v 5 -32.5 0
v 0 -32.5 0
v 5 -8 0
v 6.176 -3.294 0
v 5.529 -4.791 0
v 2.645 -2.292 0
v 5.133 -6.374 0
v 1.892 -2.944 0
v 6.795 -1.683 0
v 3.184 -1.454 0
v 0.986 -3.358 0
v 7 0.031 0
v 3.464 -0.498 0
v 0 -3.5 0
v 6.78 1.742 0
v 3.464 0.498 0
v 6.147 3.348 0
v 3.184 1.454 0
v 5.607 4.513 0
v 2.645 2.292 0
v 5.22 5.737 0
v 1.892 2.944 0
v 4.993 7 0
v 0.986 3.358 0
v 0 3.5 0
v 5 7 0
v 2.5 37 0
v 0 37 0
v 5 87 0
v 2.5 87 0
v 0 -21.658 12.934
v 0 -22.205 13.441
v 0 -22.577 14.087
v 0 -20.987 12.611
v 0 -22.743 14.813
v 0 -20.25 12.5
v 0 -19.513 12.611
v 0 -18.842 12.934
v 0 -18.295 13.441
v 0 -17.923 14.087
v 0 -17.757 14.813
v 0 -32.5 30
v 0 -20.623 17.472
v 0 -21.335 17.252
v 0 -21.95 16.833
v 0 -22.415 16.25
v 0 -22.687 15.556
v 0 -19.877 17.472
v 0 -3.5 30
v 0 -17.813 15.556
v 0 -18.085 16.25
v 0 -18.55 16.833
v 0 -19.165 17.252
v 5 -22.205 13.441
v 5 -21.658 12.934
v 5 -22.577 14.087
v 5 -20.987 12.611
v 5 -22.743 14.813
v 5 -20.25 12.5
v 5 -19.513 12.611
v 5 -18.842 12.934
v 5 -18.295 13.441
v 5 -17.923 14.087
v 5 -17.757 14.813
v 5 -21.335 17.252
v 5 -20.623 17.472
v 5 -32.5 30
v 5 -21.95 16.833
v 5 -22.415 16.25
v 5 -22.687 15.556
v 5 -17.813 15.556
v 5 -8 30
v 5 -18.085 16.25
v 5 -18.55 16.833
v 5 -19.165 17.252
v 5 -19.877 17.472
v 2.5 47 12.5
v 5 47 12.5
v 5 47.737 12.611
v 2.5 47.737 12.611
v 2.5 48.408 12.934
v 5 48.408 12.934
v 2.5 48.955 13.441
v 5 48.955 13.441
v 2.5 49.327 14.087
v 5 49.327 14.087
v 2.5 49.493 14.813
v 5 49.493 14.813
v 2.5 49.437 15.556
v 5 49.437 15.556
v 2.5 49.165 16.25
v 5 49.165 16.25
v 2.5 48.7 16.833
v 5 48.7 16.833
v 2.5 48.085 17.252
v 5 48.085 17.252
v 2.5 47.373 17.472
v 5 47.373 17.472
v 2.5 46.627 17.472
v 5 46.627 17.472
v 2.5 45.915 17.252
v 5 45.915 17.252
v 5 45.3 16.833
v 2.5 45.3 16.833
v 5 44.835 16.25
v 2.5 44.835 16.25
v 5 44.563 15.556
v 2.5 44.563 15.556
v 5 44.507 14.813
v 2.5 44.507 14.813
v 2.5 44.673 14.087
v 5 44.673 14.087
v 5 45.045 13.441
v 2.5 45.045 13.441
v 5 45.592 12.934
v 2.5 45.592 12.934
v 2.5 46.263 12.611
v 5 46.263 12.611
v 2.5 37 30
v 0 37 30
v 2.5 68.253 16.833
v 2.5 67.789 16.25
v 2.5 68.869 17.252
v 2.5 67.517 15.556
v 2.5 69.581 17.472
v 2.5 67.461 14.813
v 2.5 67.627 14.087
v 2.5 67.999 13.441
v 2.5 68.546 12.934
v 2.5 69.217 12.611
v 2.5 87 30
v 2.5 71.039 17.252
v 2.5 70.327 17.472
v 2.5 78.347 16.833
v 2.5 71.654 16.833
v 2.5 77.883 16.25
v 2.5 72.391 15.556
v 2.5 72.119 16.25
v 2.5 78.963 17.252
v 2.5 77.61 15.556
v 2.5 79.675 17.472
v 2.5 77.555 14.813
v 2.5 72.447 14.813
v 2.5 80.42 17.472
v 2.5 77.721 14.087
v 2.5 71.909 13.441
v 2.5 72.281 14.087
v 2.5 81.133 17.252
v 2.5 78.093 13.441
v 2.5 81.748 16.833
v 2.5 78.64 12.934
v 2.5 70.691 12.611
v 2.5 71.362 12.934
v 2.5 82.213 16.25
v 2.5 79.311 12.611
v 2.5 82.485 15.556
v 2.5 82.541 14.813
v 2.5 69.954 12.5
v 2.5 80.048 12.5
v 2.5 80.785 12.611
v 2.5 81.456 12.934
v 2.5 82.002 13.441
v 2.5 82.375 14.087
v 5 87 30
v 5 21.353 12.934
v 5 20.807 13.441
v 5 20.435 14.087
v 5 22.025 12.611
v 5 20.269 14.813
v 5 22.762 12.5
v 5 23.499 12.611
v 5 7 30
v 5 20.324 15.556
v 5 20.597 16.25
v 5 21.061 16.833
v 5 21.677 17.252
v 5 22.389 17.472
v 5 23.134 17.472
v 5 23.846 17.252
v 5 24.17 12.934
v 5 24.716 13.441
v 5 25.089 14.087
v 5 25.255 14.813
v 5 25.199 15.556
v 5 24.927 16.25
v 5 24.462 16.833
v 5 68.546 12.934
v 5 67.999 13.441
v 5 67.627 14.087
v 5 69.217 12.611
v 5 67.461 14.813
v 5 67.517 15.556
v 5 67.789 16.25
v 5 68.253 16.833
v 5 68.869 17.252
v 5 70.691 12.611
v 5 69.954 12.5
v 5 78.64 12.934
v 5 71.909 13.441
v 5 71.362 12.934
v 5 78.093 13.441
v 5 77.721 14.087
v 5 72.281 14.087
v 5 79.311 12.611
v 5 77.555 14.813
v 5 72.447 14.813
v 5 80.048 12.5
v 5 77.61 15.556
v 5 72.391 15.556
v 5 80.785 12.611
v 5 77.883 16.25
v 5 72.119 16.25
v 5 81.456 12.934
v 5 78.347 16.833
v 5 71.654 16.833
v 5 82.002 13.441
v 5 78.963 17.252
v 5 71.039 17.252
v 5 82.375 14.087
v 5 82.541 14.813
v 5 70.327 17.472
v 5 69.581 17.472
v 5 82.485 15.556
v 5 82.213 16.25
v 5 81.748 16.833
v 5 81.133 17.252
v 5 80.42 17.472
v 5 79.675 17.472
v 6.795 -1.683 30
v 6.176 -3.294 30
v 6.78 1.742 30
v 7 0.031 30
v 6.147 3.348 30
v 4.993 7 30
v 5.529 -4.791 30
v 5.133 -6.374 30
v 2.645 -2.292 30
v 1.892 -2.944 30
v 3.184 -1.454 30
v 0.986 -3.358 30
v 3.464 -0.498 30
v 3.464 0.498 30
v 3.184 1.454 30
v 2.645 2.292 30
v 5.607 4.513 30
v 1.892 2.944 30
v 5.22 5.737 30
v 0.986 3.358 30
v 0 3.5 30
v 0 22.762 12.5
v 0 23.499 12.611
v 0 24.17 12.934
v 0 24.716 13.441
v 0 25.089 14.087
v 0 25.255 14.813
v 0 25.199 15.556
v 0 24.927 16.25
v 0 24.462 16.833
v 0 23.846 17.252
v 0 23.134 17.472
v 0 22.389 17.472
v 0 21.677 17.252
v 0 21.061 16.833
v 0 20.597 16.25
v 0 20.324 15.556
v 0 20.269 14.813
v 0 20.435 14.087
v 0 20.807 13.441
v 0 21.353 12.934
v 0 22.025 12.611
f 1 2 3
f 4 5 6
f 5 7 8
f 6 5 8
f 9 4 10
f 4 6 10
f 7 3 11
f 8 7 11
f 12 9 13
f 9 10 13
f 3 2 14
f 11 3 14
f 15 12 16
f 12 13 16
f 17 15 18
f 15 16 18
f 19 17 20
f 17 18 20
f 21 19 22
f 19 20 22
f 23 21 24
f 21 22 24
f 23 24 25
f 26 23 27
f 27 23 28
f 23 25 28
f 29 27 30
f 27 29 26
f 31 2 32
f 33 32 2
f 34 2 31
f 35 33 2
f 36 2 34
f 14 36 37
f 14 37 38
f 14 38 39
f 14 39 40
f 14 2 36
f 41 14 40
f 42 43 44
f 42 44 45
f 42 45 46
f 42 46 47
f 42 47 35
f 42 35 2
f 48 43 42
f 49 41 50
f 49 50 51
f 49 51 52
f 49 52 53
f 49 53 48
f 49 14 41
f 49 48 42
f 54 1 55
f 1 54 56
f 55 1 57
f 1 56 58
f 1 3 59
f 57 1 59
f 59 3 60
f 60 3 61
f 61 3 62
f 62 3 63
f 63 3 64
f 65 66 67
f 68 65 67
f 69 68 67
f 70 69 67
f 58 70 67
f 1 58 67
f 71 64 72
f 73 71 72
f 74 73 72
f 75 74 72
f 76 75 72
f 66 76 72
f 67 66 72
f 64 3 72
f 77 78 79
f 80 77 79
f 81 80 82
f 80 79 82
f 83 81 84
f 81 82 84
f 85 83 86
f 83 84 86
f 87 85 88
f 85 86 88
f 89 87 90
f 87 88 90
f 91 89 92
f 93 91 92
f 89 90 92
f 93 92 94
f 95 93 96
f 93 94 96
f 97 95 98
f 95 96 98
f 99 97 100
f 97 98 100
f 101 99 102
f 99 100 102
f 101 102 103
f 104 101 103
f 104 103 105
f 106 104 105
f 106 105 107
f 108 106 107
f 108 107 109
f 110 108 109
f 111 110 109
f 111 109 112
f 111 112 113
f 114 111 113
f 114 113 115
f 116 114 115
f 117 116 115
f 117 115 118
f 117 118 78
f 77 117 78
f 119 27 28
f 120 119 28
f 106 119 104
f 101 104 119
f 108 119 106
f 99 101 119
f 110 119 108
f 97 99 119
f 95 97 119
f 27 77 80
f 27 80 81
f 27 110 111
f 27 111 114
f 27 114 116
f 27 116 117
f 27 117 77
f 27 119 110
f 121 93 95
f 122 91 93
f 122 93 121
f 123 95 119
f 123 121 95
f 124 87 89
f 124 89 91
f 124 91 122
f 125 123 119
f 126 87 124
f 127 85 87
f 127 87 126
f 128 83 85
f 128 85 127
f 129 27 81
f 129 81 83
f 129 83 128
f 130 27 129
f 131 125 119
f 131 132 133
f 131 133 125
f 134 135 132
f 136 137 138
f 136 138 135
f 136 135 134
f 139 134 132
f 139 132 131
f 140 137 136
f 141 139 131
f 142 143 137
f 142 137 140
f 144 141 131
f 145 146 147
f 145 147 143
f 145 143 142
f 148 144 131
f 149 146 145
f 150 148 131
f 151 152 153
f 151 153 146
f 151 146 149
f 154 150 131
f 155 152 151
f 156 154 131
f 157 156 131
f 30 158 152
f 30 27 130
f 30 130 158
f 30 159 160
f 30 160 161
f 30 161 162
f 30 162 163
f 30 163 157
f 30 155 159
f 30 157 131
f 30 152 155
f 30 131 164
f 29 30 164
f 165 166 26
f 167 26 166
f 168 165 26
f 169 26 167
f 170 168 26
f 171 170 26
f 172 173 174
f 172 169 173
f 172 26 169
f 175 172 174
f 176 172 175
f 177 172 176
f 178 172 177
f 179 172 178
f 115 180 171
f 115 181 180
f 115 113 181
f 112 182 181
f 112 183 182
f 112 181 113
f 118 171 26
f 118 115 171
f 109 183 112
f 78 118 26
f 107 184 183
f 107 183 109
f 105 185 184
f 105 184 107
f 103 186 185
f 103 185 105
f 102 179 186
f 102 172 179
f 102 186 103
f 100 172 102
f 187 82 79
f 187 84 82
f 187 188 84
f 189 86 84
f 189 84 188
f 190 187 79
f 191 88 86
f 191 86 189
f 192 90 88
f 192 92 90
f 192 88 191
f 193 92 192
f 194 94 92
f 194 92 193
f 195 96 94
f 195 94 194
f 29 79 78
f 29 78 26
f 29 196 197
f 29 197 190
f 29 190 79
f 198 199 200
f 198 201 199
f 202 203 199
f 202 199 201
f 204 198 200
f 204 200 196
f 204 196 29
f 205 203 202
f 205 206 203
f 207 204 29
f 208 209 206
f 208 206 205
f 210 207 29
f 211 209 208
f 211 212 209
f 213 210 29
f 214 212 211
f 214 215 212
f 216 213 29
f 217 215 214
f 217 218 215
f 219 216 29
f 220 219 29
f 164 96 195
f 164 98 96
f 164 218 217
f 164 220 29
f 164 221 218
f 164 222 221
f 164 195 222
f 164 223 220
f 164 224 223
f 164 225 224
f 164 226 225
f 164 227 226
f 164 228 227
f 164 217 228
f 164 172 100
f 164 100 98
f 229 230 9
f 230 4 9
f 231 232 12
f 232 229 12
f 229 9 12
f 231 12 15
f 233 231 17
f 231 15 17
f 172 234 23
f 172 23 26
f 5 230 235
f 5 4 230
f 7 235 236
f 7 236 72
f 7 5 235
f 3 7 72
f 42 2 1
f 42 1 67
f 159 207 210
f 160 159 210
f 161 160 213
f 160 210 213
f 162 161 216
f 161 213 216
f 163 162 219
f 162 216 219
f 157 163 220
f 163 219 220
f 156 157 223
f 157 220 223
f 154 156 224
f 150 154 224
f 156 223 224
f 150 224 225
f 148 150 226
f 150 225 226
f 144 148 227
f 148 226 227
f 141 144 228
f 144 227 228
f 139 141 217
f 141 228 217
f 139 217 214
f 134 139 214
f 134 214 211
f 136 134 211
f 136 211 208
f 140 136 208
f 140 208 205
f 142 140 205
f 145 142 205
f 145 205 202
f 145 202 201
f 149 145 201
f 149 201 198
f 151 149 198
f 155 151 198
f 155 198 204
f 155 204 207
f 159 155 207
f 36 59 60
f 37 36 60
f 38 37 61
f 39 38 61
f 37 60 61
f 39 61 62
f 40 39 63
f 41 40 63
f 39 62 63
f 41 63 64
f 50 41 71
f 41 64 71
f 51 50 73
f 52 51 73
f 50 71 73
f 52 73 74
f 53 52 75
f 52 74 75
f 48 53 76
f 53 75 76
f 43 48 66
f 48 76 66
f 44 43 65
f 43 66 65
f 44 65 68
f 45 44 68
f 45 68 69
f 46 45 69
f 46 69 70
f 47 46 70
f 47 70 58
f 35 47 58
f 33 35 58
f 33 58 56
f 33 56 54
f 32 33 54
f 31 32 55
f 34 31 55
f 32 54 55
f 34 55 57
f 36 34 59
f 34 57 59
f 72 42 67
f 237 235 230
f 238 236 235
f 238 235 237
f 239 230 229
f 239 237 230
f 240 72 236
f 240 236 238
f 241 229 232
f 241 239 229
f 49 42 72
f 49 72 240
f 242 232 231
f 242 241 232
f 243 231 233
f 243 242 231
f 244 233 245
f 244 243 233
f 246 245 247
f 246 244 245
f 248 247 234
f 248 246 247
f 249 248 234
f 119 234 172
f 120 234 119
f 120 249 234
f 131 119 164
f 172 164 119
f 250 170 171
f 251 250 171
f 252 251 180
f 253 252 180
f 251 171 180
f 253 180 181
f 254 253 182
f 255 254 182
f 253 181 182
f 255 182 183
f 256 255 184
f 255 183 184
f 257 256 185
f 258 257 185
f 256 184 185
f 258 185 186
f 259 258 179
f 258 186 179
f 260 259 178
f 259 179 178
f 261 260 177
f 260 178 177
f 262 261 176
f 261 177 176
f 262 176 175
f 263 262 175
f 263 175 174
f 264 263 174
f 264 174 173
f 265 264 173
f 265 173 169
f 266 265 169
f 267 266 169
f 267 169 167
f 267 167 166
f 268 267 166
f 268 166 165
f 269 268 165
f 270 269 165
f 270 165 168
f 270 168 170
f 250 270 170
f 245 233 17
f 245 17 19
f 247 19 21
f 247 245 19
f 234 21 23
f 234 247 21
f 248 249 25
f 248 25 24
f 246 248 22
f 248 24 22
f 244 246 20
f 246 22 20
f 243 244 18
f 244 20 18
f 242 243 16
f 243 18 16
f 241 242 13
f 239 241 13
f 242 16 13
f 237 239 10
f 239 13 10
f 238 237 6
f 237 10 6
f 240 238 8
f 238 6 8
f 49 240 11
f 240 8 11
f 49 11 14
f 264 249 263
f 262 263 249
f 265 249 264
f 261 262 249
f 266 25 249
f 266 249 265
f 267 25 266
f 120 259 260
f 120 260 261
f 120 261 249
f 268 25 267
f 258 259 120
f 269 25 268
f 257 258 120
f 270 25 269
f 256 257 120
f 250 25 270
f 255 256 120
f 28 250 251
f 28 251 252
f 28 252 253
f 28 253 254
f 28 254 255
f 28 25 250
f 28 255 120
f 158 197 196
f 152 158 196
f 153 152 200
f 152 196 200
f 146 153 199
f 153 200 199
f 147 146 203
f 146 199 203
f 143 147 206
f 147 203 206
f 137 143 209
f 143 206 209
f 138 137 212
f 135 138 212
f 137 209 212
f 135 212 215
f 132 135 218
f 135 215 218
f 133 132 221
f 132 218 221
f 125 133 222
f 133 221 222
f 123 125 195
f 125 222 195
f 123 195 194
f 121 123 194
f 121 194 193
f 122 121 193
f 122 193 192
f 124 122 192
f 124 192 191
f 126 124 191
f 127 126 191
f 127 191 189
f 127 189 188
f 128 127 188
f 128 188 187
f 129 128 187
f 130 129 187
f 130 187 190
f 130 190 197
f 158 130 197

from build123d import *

# Parameters (mm, degrees)
SKETCH1_R           = 7
SKETCH1_R_2         = 2.5
BOSS_EXTRUDE1_DEPTH = 30
SKETCH2_W           = 5
SKETCH2_H           = 80
BOSS_EXTRUDE2_DEPTH = 30
SKETCH3_W           = 4.993372703
SKETCH3_H           = 5.857886356
BOSS_EXTRUDE3_DEPTH = 30
FILLET1_R           = 10
SKETCH4_R           = 2.5
CUT_EXTRUDE1_DEPTH  = 30
SKETCH5_W           = 18.483603476
SKETCH5_H           = 15.568617645
CUT_EXTRUDE2_DEPTH  = 30
SKETCH6_W           = 30
SKETCH6_H           = 30
BOSS_EXTRUDE4_DEPTH = 5
FILLET2_R           = 10
SKETCH7_R           = 2.5
CUT_EXTRUDE3_DEPTH  = 5
SKETCH8_R           = 3.5
CUT_EXTRUDE4_DEPTH  = 45
SKETCH9_W           = 2.5
SKETCH9_H           = 50
CUT_EXTRUDE5_DEPTH  = 50


with BuildPart() as part:
    # Sketch1 → Boss-Extrude1 (new body)
    with BuildSketch(Plane.XY):
        Circle(SKETCH1_R)
        Circle(SKETCH1_R_2, mode=Mode.SUBTRACT)
    extrude(amount=BOSS_EXTRUDE1_DEPTH)



with BuildPart() as body_2:
    # Sketch2 → Boss-Extrude2 (new body)
    with BuildSketch(Plane.XY.offset(30)):
        with Locations((2.5, 47)):
            Rectangle(SKETCH2_W, SKETCH2_H)
    extrude(amount=-BOSS_EXTRUDE2_DEPTH)


with BuildPart() as part_1:
    add(part.part)

    add(body_2.part)  # Boss-Extrude3 merges body 2
    # Sketch3 → Boss-Extrude3 (add)
    with BuildSketch(Plane.XY.offset(30)):
        with Locations((2.496686352, 6.222987156)):
            Rectangle(SKETCH3_W, SKETCH3_H)
    extrude(amount=-BOSS_EXTRUDE3_DEPTH)

    # Fillet1
    # the kernel refuses this fillet: 10 mm, written as the material it adds along each edge
    with BuildSketch(Plane(origin=(4.993372703, 4.905734302, 30), x_dir=(0.5953030074324868, -0.8035012939266724, 0), z_dir=(0, 0, -1))) as fillet1_piece_1:
        with BuildLine():
            CenterArc((3.322951104, -9.903685446), FILLET1_R, 97.958528589, 22.079165002)
            Line((-1.682745198, -1.246722668), (-1.782859124, -1.073583413))
            ThreePointArc((-1.782859124, -1.073583413), (-0.9604332, -0.462661075), (-0.119060601, 0.160700259))
            Line((-0.119060601, 0.160700259), (0.027691259, 0.198073709))
            ThreePointArc((0.027691259, 0.198073709), (0.969194072, 0.132579812), (1.910696885, 0.198073709))
            Line((1.910696885, 0.198073709), (1.938388144, 0))
        make_face()
    extrude(amount=30)

    # Sketch4 → Cut-Extrude1 (cut)
    with BuildSketch(Plane(origin=(5, 0, 0), x_dir=(0, 0, -1), z_dir=(1, 0, 0))):
        with Locations((-15, 22.761745694)):
            Circle(SKETCH4_R)
        with Locations((-15, 47)):
            Circle(SKETCH4_R)
        with Locations((-15, 69.953924783)):
            Circle(SKETCH4_R)
        with Locations((-15, 80.047807532)):
            Circle(SKETCH4_R)
    extrude(amount=-CUT_EXTRUDE1_DEPTH, mode=Mode.SUBTRACT)

    # Sketch5 → Cut-Extrude2 (cut)
    with BuildSketch(Plane(origin=(0, 0, 0), x_dir=(-1, 0, 0), z_dir=(0, 0, -1))):
        with Locations((9.241801738, -0.784308822)):
            Rectangle(SKETCH5_W, SKETCH5_H)
    extrude(amount=-CUT_EXTRUDE2_DEPTH, mode=Mode.SUBTRACT)

    # Sketch6 → Boss-Extrude4 (add)
    with BuildSketch(Plane.ZY):
        with Locations((15, -17.5)):
            Rectangle(SKETCH6_W, SKETCH6_H)
    extrude(amount=-BOSS_EXTRUDE4_DEPTH)

    # Fillet2
    fillet2_edges = [part_1.edges().sort_by_distance(p)[0] for p in [
        (5, -4.898979486, 15),
    ]]
    fillet(fillet2_edges, radius=FILLET2_R)

    # Sketch7 → Cut-Extrude3 (cut)
    with BuildSketch(Plane(origin=(5, 0, 0), x_dir=(0, 0, -1), z_dir=(1, 0, 0))):
        with Locations((-15, -20.25)):
            Circle(SKETCH7_R)
    extrude(amount=-CUT_EXTRUDE3_DEPTH, mode=Mode.SUBTRACT)

    # Sketch8 → Cut-Extrude4 (cut)
    with BuildSketch(Plane(origin=(0, 0, 0), x_dir=(-1, 0, 0), z_dir=(0, 0, -1))):
        Circle(SKETCH8_R)
    extrude(amount=-CUT_EXTRUDE4_DEPTH, mode=Mode.SUBTRACT)

    # Sketch9 → Cut-Extrude5 (cut)
    with BuildSketch(Plane(origin=(0, 0, 0), x_dir=(-1, 0, 0), z_dir=(0, 0, -1))):
        with Locations((-1.25, 62)):
            Rectangle(SKETCH9_W, SKETCH9_H)
    extrude(amount=-CUT_EXTRUDE5_DEPTH, mode=Mode.SUBTRACT)


solid = part_1.part
